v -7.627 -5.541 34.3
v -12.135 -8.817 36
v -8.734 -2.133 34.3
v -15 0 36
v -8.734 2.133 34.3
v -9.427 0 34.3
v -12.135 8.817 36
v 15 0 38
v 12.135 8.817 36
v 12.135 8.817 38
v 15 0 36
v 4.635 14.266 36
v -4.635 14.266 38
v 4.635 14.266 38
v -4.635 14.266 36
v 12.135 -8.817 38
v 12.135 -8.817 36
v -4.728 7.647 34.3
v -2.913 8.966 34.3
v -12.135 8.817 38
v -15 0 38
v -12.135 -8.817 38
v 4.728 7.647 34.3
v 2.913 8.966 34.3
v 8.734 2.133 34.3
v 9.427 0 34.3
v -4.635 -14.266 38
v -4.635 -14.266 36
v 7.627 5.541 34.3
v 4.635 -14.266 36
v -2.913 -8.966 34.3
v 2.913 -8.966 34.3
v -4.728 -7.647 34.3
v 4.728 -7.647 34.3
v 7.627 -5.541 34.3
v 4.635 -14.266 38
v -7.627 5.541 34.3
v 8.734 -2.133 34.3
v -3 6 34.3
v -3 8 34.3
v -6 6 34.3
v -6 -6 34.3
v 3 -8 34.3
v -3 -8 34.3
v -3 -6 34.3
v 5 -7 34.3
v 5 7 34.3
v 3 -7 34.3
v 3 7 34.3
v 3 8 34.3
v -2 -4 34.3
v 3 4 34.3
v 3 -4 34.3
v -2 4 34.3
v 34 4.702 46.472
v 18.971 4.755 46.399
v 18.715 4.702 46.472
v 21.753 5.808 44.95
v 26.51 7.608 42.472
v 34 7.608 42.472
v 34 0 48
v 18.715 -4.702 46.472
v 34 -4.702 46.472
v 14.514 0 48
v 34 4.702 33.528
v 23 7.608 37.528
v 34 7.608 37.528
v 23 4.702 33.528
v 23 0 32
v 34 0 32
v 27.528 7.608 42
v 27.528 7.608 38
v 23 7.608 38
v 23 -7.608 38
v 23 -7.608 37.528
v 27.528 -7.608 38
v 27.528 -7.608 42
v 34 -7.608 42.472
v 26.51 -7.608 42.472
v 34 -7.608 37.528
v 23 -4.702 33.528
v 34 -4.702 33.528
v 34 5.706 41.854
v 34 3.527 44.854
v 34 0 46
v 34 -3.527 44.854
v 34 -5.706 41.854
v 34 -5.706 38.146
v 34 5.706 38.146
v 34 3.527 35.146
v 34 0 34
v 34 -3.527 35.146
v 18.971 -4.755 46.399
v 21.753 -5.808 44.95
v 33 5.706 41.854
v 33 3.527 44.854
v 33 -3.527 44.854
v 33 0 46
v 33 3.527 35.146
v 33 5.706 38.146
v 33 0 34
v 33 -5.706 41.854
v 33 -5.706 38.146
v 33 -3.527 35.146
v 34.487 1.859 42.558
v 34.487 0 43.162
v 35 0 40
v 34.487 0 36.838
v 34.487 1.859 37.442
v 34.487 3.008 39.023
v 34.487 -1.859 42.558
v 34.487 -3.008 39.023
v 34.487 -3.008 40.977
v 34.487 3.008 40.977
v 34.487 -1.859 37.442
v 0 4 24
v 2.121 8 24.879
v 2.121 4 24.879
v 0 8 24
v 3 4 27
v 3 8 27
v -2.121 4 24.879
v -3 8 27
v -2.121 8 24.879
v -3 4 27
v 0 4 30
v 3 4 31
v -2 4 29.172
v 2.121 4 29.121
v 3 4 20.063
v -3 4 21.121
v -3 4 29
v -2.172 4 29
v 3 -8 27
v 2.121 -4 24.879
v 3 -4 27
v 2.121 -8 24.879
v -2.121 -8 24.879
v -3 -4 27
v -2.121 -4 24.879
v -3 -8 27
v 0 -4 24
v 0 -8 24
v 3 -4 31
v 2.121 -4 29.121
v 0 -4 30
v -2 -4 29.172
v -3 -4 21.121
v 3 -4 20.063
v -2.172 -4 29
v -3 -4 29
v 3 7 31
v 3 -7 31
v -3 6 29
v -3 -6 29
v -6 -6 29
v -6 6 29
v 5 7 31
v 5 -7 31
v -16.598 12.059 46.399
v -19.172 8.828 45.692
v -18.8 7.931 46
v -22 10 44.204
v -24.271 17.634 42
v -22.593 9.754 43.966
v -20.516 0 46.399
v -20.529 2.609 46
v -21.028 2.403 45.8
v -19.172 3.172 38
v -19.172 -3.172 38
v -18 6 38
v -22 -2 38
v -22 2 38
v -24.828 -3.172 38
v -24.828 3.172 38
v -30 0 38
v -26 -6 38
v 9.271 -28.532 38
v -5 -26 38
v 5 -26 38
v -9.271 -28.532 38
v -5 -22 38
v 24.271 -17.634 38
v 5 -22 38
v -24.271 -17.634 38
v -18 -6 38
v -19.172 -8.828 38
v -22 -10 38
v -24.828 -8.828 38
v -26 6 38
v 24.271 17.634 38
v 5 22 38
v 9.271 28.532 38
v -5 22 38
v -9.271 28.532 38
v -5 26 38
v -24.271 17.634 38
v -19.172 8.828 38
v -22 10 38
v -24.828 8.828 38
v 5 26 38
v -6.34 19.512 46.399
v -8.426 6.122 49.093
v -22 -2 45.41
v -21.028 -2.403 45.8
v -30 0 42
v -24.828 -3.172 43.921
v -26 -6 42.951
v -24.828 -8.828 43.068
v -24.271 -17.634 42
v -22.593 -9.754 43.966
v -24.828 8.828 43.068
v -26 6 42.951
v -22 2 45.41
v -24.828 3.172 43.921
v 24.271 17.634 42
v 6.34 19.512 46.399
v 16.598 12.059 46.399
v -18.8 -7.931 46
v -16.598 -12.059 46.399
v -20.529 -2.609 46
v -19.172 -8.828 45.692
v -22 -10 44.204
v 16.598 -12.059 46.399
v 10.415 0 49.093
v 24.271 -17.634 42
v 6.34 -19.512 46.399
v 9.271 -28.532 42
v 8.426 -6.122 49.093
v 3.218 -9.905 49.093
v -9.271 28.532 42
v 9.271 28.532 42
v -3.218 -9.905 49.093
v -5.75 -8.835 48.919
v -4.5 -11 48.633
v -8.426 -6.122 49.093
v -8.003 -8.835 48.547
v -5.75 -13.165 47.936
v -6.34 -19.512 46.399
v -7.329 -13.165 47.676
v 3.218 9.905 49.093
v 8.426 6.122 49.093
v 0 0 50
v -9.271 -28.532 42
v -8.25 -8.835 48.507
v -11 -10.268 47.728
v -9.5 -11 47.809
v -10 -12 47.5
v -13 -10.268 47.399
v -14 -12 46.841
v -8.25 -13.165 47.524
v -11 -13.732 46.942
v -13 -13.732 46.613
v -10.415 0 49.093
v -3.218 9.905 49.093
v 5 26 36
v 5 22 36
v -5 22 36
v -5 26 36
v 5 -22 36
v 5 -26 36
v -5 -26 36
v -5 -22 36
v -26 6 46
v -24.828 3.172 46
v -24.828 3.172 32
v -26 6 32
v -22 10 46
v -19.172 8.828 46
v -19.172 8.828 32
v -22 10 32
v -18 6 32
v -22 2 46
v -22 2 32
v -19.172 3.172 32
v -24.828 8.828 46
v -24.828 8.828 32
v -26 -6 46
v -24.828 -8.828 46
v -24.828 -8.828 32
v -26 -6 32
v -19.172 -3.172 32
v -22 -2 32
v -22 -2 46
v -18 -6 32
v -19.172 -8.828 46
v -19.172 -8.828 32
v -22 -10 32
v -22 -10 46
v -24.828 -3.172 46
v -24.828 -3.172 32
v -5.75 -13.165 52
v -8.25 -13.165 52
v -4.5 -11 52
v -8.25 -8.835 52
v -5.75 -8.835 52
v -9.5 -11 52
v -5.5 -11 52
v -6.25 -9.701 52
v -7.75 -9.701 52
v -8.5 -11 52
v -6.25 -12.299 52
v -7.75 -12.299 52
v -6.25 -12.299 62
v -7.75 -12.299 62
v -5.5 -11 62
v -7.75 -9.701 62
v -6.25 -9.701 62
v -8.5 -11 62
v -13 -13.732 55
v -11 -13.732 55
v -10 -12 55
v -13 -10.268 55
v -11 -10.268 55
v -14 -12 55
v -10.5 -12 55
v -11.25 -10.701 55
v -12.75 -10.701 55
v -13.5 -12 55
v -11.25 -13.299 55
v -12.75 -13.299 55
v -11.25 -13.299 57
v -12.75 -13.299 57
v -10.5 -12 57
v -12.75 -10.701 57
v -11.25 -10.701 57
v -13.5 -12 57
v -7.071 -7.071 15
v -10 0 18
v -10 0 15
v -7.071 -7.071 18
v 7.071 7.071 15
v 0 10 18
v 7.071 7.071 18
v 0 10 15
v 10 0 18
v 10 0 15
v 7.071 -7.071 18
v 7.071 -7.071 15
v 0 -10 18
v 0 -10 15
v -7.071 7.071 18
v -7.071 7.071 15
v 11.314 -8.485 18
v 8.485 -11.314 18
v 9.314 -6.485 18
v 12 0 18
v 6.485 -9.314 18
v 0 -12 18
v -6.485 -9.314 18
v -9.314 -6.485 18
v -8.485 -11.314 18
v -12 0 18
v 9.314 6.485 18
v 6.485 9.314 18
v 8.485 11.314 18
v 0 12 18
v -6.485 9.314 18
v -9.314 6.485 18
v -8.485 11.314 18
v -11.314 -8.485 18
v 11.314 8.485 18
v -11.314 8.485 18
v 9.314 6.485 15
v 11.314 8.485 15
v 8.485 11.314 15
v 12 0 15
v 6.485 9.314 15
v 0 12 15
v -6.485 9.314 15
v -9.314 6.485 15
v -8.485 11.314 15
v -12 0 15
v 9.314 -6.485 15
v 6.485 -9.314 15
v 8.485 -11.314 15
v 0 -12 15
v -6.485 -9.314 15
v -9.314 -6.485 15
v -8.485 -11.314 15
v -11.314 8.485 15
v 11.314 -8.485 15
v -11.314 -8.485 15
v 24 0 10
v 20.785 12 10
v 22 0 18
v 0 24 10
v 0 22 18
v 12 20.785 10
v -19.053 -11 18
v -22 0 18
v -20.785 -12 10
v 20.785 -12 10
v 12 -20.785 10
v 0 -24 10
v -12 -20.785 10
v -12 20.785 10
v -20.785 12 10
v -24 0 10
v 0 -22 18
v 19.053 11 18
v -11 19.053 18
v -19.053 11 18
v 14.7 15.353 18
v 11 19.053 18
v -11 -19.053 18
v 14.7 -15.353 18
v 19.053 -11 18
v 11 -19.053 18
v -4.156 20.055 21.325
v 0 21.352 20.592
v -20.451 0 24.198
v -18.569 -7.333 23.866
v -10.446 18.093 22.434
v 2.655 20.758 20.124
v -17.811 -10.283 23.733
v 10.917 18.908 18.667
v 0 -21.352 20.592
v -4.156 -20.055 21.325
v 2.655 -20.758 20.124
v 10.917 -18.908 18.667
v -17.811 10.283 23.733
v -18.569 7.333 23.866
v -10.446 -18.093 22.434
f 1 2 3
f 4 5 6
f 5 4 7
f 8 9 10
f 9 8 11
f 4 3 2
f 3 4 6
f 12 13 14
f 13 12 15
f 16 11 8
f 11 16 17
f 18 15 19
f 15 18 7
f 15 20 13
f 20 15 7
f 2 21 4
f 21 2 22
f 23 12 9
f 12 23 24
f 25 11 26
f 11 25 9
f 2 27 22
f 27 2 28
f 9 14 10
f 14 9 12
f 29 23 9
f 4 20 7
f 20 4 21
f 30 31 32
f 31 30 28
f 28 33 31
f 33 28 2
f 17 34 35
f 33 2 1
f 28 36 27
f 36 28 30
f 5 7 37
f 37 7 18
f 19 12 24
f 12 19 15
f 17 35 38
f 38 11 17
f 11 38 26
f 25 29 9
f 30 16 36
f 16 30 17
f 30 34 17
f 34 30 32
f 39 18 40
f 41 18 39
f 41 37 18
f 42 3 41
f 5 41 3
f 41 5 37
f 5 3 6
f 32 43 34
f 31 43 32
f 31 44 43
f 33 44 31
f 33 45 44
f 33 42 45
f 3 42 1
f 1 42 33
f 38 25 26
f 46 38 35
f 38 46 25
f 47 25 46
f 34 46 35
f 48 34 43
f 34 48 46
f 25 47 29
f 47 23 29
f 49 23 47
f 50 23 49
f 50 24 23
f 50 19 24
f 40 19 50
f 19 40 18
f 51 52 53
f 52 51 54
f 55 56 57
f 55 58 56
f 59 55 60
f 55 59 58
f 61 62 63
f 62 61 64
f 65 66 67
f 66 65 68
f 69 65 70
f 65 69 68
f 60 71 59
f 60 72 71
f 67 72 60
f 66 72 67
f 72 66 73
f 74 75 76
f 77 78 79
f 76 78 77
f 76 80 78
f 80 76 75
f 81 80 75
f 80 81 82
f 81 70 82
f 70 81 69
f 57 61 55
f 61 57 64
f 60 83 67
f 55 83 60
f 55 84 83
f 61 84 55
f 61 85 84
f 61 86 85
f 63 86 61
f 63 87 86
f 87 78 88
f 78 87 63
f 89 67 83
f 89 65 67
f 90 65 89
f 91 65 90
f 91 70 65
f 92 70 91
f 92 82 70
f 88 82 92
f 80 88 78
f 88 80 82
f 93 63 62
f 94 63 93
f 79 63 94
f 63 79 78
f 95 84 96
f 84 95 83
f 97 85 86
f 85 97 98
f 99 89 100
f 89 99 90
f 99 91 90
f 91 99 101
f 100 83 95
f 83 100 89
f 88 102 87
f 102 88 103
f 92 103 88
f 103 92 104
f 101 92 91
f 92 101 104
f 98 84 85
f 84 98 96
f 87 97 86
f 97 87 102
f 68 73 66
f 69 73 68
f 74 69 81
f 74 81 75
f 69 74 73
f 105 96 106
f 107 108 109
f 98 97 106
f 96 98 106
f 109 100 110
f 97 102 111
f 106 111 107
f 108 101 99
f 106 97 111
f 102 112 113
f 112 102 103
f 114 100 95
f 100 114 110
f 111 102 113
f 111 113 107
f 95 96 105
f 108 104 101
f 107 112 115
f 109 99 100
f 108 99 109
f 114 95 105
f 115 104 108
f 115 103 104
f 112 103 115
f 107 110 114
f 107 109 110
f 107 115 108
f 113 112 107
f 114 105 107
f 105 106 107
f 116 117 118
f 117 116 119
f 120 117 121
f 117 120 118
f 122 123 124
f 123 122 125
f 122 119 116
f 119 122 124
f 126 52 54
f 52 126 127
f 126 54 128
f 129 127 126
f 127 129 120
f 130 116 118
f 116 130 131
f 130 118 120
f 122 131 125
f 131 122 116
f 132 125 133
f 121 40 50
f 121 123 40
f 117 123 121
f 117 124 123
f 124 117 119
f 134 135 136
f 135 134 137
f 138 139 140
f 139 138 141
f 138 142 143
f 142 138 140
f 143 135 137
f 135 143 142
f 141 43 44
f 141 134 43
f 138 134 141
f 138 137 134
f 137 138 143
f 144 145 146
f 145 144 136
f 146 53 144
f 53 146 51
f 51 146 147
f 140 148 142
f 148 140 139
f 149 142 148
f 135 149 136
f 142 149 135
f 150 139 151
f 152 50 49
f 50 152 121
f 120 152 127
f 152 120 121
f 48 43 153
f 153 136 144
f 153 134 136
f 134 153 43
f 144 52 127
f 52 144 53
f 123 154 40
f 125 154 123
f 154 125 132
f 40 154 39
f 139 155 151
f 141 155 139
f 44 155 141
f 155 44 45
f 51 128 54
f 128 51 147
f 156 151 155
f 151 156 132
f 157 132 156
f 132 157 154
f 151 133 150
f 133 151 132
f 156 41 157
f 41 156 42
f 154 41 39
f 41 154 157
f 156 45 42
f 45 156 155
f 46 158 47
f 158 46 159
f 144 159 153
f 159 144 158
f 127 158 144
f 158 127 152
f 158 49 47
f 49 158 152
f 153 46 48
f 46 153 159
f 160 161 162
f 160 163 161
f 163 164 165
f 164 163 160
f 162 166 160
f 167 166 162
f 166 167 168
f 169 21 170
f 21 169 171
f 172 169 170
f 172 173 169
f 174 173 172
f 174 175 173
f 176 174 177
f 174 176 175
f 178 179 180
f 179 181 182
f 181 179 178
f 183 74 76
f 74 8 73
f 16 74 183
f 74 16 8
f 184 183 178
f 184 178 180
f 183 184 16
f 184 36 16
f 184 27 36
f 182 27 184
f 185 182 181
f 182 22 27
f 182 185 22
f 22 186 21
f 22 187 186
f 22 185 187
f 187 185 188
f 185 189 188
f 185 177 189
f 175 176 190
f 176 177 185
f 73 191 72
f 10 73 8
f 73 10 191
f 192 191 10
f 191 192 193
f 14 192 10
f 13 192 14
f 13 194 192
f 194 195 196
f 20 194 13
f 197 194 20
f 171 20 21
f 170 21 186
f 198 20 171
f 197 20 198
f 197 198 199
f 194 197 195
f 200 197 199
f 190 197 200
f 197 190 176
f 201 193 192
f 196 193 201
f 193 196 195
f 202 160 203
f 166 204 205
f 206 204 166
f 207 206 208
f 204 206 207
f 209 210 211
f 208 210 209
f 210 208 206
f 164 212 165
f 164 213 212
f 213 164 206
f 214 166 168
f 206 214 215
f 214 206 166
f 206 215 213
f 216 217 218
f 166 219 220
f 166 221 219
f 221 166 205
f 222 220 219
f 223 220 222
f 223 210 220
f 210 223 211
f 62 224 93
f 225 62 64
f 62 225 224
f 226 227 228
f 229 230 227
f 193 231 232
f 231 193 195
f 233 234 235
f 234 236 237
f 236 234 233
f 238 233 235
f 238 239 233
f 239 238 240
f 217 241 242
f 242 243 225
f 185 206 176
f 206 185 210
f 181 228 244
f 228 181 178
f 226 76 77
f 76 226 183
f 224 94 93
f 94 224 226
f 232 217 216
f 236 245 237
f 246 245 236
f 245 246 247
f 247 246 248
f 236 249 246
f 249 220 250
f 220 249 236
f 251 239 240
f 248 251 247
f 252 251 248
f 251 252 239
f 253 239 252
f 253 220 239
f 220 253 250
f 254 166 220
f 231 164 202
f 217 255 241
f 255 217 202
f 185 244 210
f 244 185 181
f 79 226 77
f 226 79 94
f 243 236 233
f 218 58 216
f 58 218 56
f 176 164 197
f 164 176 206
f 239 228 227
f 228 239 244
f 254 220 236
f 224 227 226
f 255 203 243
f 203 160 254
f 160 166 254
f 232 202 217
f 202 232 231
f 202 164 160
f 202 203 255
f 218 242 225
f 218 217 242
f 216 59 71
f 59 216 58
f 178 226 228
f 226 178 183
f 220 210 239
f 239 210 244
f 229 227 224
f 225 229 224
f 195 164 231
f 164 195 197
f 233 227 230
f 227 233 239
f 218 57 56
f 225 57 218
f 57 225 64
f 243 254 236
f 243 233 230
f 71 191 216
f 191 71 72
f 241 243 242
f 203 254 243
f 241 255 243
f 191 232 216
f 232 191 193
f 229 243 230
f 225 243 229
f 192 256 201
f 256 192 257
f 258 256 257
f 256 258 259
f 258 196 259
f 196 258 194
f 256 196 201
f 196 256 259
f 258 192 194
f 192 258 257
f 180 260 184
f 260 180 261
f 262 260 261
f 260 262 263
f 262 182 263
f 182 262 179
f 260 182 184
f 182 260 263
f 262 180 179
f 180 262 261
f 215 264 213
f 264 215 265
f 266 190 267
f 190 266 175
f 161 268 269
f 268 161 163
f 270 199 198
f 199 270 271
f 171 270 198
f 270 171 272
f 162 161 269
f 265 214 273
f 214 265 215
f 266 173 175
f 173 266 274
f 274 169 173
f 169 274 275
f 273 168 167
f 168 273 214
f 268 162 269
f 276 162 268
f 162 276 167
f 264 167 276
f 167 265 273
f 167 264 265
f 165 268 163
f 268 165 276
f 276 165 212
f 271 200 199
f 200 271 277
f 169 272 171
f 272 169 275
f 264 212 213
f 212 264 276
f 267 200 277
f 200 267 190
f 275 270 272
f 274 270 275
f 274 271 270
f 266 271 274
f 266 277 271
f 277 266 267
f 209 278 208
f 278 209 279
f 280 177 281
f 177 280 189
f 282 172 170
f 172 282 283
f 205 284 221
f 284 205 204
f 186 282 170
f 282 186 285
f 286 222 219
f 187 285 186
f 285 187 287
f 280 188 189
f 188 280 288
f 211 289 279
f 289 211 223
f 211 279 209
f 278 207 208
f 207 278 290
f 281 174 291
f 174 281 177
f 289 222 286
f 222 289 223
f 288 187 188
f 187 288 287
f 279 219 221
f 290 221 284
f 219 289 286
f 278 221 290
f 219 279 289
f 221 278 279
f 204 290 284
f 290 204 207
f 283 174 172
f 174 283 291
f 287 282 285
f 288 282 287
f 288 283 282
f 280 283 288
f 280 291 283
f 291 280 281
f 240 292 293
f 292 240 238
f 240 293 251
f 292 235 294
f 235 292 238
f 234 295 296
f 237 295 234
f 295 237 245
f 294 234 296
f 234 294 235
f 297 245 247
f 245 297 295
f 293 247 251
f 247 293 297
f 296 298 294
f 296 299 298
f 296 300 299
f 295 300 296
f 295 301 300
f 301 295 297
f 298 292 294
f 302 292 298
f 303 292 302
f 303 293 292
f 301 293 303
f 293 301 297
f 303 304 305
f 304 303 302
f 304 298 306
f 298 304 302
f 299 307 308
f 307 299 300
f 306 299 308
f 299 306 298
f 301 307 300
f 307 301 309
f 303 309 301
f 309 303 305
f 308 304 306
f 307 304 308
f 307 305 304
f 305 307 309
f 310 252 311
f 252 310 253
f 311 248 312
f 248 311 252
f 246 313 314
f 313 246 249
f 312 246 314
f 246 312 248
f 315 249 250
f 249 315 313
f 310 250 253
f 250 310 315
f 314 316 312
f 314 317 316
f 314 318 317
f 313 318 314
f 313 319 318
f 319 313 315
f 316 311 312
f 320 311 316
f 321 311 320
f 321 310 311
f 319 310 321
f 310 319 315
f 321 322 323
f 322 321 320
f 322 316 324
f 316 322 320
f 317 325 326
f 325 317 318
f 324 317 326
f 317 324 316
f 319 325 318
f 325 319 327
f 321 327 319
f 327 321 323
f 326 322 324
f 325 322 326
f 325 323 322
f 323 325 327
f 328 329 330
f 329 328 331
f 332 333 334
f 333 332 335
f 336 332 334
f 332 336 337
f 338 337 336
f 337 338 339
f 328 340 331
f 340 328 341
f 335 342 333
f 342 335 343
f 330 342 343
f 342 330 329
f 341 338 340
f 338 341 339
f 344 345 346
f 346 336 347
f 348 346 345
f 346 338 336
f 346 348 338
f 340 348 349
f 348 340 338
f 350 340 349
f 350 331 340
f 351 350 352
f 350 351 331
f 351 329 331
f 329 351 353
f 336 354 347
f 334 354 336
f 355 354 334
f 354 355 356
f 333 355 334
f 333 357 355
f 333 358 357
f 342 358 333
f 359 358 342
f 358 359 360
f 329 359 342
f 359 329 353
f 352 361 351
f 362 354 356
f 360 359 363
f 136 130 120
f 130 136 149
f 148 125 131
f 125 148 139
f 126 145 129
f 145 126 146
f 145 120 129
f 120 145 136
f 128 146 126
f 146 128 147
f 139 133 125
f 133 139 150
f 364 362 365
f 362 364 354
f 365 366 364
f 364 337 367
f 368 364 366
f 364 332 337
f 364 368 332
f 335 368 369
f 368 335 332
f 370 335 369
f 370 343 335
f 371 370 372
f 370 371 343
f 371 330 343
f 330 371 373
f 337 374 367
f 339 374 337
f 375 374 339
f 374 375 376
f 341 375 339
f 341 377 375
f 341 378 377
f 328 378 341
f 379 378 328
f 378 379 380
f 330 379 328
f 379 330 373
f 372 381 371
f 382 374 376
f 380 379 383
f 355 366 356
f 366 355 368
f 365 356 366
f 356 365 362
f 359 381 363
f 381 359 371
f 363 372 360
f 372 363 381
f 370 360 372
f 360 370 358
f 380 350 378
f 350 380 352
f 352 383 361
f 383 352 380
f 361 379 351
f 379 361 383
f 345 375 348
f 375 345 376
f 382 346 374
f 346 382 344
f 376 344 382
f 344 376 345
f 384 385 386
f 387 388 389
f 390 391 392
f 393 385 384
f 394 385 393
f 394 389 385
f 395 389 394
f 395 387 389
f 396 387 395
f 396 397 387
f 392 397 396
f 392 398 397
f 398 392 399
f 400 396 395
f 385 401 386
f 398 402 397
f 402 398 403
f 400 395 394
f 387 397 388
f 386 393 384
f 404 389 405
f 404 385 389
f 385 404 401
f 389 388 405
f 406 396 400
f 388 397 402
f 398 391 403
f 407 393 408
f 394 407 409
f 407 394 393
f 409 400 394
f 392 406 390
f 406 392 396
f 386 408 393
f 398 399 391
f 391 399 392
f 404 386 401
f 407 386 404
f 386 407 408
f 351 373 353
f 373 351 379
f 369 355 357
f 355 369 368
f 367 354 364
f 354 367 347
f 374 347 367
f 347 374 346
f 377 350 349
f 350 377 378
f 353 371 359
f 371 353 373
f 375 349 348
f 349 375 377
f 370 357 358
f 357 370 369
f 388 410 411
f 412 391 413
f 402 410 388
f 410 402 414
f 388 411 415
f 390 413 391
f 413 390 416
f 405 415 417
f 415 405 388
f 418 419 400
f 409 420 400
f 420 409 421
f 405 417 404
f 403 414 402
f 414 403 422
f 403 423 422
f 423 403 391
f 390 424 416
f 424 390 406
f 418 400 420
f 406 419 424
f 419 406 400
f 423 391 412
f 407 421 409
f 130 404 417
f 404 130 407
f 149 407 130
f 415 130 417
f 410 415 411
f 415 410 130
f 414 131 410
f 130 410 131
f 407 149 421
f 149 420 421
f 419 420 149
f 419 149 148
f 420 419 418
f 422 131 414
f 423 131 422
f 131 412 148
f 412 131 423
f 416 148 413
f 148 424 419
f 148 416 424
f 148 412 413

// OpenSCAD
// file: ../../lasercraft/utils.scad
// utils functions #######################

// piece id tester #######################

function tstid(id) = (ext_id == -1 || ext_id == id)? true : false;

// gizmo #################################

module gizmo() {
  color("yellow") cube(1,true);
  color("red") translate([5,0,0]) cube(1,true);
  color("green") translate([0,5,0]) cube(1,true);
  color("blue") translate([0,0,5]) cube(1,true);
}

// polygon slice #########################

module slice(points,thickness) {
  translate([0,0,-1]) linear_extrude(thickness) polygon(points);
}

// ring ##################################

module ring(ext,int,h,n) {
  difference() {
    cylinder(h,d=ext,$fn=n,center=false);
    translate([0,0,-0.5]) cylinder(h+1,d=int,$fn=n,center=false);
  }
}

// mirror path ###########################

function mirror_x(path) = concat(path,[for (i = [len(path)-1:-1:0]) [-1*path[i][0],path[i][1]]]);

function mirror_y(path) = concat(path,[for (i = [len(path)-1:-1:0]) [path[i][0],-1*path[i][1]]]);

function mirror_xy(path) = mirror_x(mirror_y(path));

function mirror_yx(path) = mirror_y(mirror_x(path));

// math functions ########################

// distance between 2 vectors
function dist_2v(v1,v2) = let (x = v2[0]-v1[0],y = v2[1]-v1[1]) sqrt(x*x+y*y);

// angle of a segment
function ang_2v(v1,v2) = let (x = v2[0]-v1[0],y = v2[1]-v1[1]) atan(y/x);

// arc functions #########################

// arc from 2 points and 1 height
function arc_2p1h(p1,p2,h,n) =
  let (
    ah = abs(h), s = (h/abs(h)),
    w = dist_2v(p1,p2)/2,hyp = sqrt(ah*ah+w*w),r = (hyp/2)/(ah/hyp),
    dev_ang = (abs(ang_2v(p1,p2))+((p1[0]>p2[0])? 90 : 0))*((p1[1]>p2[1])? -1 : 1),
    sh = s*((ah<w)? -1 : 1)*sqrt(r*r-w*w),
    //
    m = [(p2[0]-p1[0])/2+p1[0],(p2[1]-p1[1])/2+p1[1]],
    c = [cos(dev_ang+90)*sh+m[0],sin(dev_ang+90)*sh+m[1]],
    //
    start_ang = 180+((sh >= 0)? 1 : -1)*abs(acos(w/r))+dev_ang,
    end_ang = ((sh >= 0)? -1 : 1)*abs(acos(w/r))+dev_ang,
    //
    ang = abs(end_ang-start_ang)
    //
  )
  concat(
    [p1],
    [c],[[w,sh]],
    [[dev_ang,ang]],[[start_ang,end_ang]],
    //
    [for (i=[1:n-1]) let (tmp = start_ang-(h/abs(h))*(ang/n)*i) [cos(tmp)*r+c[0],sin(tmp)*r+c[1]]],
    //
    [p2]
  );

// half arc from 2 points
function arc_h2p(p1,p2,n) =
  let ()
  concat(
    [p1],
    //
    //
    [p2]
  );

// arc from 2 points and 1 center
function arc_2p1c(p1,p2,c,s,n) =
  let(
    //
    r = dist_2v(c,p1)
    //
  )
  concat(
    [p1],
    //
    //
    [p2]
  );

// arc from 3 points
function arc_3p(p1,p2,p3,n) =
  let(
    //
    //
  )
  //
  //
  0;

// ortho demi arc
function demi_arc(h,w,n,o=[0,0]) =
  let (hyp = sqrt(h*h+w*w),r = (hyp/2) / (h/hyp),ang = (90-acos(h/hyp))*2)
  concat(
    [[o[0],h+o[1]]],
    [for (i=[1:n-1]) let (tmp = 90-(ang/n)*i) [cos(tmp)*r+o[0],sin(tmp)*r-(r-h)+o[1]]],
    [[w+o[0],o[1]]]
  );

// ortho arc
function arc(h,w,n,o=[0,0]) =
  let (hyp = sqrt(h*h+(w/2)*(w/2)),r = (hyp/2) / (h/hyp),ang = (90-acos(h/hyp))*4)
  concat(
    [[-(w/2)+o[0],o[1]]],
    [for (i=[1:n-1]) let (tmp = 90+(ang/2)-(ang/n)*i) [cos(tmp)*r+o[0],sin(tmp)*r-(r-h)+o[1]]],
    [[w/2+o[0],o[1]]]
  );

// TEST ZONE ########

/*
translate([5,10,0.5]) color("yellow") cube([1,1,1],center=true);
translate([10,5,0.5]) color("yellow") cube([1,1,1],center=true);
translate([7.5,7.5,0.5]) color("pink") cube([1,1,1],center=true);
translate([14.6,14.6,0.5]) color("turquoise") cube([1,1,1],center=true);
translate([0.4,0.4,0.5]) color("turquoise") cube([1,1,1],center=true);
translate([4.4,4.4,0.5]) color("blue") cube([1,1,1],center=true);
translate([10.5,10.5,0.5]) color("blue") cube([1,1,1],center=true);
//translate([9.8,9.8,0.5]) color("blue") cube([1,1,1],center=true);

//pts = arc_2p1h([5,10],[10,5],-10,5);
//echo(pts);
//polygon(pts);
pts = arc_2p1c([5,10],[10,5],[4.4,4.4],1,5);
//pts = arc_2p1c([5,10],[10,5],[10.5,10.5],1,5);
echo(pts);
polygon(pts);
//*/

//*
module test_arc_3p(p1,p2,p3,n) {
  translate([p1[0],p1[1],1]) color("blue") cube(1,center=true);
  translate([p2[0],p2[1],1]) color("blue") cube(1,center=true);
  translate([p3[0],p3[1],1]) color("pink") cube(1,center=true);
  pts = arc_3p(p1,p2,p3,n);
  echo(pts);
  //polygon(pts);
}

//test_arc_3p([5,10],[10,5],[10,10],5);
//*/
// main file
// infos ###########################

//nb pieces : 4

// includes ########################

include <../../lasercraft/utils.scad>;

// variables #######################

ext_id = -1;
all = (ext_id < 0)? true : false;
$fn = 12;

neck_head = 24;
body_neck = 4;

body_ground = 10;
neck_ground = body_neck+body_ground;
head_ground = neck_head+neck_ground;

// functions #######################

module head() {
  union() {
    // base top
    translate([0,0,4])
    rotate_extrude(angle=360,$fn=10)
    polygon(concat([[30,-4],[0,-4]],demi_arc(8,30,3)));
    translate([0,0,-2]) rotate([180,0,0])
    // base bottom
    difference() {
      rotate_extrude(angle=360,$fn=10)
      polygon(concat([[15,-3],[0,-3]],demi_arc(3,15,2)));
      translate([0,0,1.7]) cylinder(3,d=20,$fn=10);
    }
    // inverse bars
    translate([0,24,0]) cube([10,4,4],center=true);
    translate([0,-24,0]) cube([10,4,4],center=true);
    // lens
    deep = 20;
    translate([14,0,2]) rotate([0,90,0]) union() {
      difference() {
        cylinder(deep,d=16,$fn=10);
        translate([0,0,deep-1]) cylinder(2,d=12,$fn=10);
        translate([4,0,4]) cube([10,18,10],center=true);
      }
      translate([0,0,deep-1])
      rotate_extrude(angle=360,$fn=10)
      polygon(concat([[6,-1],[0,-1]],demi_arc(2,6,2)));
    }
    // memories
    translate([-22,6,-6]) cylinder(14,d=8,$fn=8);
    translate([-22,-6,-6]) cylinder(14,d=8,$fn=8);
    // antennas
    translate([-7,-11,9]) cylinder(5,d=5,$fn=6);
    translate([-7,-11,13]) cylinder(11,d=3,$fn=6);
    translate([-12,-12,8]) cylinder(9,d=4,$fn=6);
    translate([-12,-12,16]) cylinder(3,d=3,$fn=6);
    // neck atlas
    translate([0,0,-11]) neck_atlas();
  }
}

module neck_atlas() {
  union() {
    translate([0,6,0]) rotate([90,0,0]) cylinder(4,d=6,$fn=8,center=true);
    translate([0,-6,0]) rotate([90,0,0]) cylinder(4,d=6,$fn=8,center=true);
    translate([0,6,4]) cube([6,4,8],center=true);
    translate([0,-6,4]) cube([6,4,8],center=true);
    translate([-4,0,5]) cube([4,12,6],center=true);
    translate([4,0,6]) cube([2,14,4],center=true);
  }
}

module neck_base() {
  union() {
    cylinder(4,d=20,$fn=8);
    translate([-3,-4,3]) cube([6,8,10],center=false);
    translate([0,0,13]) rotate([90,0,0]) cylinder(8,d=6,$fn=8,center=true);
  }
}

module body() {
  union() {
    difference() {
      cylinder(8,d1=48,d2=44,$fn=12);
      translate([0,0,5]) cylinder(5,d=24,$fn=8);
      for (i = [0:3]) { rotate([0,0,i*90-45]) translate([0,12,8]) cube([4,4,6],center=true); }
    }
    //
    difference() {
      translate([0,0,8]) cylinder(8,d1=44,d2=40,$fn=12);
      translate([14,0,0]) rotate([0,-10,180]) translate([-10,-23,8]) cube([50,46,20],center=false);
      //
      //#cylinder();
      //
    }
    //
  }
}

module barda() {
  //
  //
}

module thigh() {
  //
  //
}

module thigh_L() {
  //
  //
}

module thigh_R() {
  //
  //
}

module leg() {
  //
  //
}

// composing #######################

if (tstid(0)) translate([0,0,head_ground]) head();
if (tstid(1)) translate([0,0,neck_ground]) neck_base();

if (tstid(2)) translate([0,0,body_ground]) body();

if (tstid(3)) translate([0,0,0]) barda();

// shoulders
// arms
// forearms
// fingers

thigh_L();

thigh_R();

// legs
// foots

// description

// barda -> gros sac montant
// body -> une seul partie, gros oeuf creusé
// legs -> séparée


// zone de construction
//cube([200,200,1],true);
